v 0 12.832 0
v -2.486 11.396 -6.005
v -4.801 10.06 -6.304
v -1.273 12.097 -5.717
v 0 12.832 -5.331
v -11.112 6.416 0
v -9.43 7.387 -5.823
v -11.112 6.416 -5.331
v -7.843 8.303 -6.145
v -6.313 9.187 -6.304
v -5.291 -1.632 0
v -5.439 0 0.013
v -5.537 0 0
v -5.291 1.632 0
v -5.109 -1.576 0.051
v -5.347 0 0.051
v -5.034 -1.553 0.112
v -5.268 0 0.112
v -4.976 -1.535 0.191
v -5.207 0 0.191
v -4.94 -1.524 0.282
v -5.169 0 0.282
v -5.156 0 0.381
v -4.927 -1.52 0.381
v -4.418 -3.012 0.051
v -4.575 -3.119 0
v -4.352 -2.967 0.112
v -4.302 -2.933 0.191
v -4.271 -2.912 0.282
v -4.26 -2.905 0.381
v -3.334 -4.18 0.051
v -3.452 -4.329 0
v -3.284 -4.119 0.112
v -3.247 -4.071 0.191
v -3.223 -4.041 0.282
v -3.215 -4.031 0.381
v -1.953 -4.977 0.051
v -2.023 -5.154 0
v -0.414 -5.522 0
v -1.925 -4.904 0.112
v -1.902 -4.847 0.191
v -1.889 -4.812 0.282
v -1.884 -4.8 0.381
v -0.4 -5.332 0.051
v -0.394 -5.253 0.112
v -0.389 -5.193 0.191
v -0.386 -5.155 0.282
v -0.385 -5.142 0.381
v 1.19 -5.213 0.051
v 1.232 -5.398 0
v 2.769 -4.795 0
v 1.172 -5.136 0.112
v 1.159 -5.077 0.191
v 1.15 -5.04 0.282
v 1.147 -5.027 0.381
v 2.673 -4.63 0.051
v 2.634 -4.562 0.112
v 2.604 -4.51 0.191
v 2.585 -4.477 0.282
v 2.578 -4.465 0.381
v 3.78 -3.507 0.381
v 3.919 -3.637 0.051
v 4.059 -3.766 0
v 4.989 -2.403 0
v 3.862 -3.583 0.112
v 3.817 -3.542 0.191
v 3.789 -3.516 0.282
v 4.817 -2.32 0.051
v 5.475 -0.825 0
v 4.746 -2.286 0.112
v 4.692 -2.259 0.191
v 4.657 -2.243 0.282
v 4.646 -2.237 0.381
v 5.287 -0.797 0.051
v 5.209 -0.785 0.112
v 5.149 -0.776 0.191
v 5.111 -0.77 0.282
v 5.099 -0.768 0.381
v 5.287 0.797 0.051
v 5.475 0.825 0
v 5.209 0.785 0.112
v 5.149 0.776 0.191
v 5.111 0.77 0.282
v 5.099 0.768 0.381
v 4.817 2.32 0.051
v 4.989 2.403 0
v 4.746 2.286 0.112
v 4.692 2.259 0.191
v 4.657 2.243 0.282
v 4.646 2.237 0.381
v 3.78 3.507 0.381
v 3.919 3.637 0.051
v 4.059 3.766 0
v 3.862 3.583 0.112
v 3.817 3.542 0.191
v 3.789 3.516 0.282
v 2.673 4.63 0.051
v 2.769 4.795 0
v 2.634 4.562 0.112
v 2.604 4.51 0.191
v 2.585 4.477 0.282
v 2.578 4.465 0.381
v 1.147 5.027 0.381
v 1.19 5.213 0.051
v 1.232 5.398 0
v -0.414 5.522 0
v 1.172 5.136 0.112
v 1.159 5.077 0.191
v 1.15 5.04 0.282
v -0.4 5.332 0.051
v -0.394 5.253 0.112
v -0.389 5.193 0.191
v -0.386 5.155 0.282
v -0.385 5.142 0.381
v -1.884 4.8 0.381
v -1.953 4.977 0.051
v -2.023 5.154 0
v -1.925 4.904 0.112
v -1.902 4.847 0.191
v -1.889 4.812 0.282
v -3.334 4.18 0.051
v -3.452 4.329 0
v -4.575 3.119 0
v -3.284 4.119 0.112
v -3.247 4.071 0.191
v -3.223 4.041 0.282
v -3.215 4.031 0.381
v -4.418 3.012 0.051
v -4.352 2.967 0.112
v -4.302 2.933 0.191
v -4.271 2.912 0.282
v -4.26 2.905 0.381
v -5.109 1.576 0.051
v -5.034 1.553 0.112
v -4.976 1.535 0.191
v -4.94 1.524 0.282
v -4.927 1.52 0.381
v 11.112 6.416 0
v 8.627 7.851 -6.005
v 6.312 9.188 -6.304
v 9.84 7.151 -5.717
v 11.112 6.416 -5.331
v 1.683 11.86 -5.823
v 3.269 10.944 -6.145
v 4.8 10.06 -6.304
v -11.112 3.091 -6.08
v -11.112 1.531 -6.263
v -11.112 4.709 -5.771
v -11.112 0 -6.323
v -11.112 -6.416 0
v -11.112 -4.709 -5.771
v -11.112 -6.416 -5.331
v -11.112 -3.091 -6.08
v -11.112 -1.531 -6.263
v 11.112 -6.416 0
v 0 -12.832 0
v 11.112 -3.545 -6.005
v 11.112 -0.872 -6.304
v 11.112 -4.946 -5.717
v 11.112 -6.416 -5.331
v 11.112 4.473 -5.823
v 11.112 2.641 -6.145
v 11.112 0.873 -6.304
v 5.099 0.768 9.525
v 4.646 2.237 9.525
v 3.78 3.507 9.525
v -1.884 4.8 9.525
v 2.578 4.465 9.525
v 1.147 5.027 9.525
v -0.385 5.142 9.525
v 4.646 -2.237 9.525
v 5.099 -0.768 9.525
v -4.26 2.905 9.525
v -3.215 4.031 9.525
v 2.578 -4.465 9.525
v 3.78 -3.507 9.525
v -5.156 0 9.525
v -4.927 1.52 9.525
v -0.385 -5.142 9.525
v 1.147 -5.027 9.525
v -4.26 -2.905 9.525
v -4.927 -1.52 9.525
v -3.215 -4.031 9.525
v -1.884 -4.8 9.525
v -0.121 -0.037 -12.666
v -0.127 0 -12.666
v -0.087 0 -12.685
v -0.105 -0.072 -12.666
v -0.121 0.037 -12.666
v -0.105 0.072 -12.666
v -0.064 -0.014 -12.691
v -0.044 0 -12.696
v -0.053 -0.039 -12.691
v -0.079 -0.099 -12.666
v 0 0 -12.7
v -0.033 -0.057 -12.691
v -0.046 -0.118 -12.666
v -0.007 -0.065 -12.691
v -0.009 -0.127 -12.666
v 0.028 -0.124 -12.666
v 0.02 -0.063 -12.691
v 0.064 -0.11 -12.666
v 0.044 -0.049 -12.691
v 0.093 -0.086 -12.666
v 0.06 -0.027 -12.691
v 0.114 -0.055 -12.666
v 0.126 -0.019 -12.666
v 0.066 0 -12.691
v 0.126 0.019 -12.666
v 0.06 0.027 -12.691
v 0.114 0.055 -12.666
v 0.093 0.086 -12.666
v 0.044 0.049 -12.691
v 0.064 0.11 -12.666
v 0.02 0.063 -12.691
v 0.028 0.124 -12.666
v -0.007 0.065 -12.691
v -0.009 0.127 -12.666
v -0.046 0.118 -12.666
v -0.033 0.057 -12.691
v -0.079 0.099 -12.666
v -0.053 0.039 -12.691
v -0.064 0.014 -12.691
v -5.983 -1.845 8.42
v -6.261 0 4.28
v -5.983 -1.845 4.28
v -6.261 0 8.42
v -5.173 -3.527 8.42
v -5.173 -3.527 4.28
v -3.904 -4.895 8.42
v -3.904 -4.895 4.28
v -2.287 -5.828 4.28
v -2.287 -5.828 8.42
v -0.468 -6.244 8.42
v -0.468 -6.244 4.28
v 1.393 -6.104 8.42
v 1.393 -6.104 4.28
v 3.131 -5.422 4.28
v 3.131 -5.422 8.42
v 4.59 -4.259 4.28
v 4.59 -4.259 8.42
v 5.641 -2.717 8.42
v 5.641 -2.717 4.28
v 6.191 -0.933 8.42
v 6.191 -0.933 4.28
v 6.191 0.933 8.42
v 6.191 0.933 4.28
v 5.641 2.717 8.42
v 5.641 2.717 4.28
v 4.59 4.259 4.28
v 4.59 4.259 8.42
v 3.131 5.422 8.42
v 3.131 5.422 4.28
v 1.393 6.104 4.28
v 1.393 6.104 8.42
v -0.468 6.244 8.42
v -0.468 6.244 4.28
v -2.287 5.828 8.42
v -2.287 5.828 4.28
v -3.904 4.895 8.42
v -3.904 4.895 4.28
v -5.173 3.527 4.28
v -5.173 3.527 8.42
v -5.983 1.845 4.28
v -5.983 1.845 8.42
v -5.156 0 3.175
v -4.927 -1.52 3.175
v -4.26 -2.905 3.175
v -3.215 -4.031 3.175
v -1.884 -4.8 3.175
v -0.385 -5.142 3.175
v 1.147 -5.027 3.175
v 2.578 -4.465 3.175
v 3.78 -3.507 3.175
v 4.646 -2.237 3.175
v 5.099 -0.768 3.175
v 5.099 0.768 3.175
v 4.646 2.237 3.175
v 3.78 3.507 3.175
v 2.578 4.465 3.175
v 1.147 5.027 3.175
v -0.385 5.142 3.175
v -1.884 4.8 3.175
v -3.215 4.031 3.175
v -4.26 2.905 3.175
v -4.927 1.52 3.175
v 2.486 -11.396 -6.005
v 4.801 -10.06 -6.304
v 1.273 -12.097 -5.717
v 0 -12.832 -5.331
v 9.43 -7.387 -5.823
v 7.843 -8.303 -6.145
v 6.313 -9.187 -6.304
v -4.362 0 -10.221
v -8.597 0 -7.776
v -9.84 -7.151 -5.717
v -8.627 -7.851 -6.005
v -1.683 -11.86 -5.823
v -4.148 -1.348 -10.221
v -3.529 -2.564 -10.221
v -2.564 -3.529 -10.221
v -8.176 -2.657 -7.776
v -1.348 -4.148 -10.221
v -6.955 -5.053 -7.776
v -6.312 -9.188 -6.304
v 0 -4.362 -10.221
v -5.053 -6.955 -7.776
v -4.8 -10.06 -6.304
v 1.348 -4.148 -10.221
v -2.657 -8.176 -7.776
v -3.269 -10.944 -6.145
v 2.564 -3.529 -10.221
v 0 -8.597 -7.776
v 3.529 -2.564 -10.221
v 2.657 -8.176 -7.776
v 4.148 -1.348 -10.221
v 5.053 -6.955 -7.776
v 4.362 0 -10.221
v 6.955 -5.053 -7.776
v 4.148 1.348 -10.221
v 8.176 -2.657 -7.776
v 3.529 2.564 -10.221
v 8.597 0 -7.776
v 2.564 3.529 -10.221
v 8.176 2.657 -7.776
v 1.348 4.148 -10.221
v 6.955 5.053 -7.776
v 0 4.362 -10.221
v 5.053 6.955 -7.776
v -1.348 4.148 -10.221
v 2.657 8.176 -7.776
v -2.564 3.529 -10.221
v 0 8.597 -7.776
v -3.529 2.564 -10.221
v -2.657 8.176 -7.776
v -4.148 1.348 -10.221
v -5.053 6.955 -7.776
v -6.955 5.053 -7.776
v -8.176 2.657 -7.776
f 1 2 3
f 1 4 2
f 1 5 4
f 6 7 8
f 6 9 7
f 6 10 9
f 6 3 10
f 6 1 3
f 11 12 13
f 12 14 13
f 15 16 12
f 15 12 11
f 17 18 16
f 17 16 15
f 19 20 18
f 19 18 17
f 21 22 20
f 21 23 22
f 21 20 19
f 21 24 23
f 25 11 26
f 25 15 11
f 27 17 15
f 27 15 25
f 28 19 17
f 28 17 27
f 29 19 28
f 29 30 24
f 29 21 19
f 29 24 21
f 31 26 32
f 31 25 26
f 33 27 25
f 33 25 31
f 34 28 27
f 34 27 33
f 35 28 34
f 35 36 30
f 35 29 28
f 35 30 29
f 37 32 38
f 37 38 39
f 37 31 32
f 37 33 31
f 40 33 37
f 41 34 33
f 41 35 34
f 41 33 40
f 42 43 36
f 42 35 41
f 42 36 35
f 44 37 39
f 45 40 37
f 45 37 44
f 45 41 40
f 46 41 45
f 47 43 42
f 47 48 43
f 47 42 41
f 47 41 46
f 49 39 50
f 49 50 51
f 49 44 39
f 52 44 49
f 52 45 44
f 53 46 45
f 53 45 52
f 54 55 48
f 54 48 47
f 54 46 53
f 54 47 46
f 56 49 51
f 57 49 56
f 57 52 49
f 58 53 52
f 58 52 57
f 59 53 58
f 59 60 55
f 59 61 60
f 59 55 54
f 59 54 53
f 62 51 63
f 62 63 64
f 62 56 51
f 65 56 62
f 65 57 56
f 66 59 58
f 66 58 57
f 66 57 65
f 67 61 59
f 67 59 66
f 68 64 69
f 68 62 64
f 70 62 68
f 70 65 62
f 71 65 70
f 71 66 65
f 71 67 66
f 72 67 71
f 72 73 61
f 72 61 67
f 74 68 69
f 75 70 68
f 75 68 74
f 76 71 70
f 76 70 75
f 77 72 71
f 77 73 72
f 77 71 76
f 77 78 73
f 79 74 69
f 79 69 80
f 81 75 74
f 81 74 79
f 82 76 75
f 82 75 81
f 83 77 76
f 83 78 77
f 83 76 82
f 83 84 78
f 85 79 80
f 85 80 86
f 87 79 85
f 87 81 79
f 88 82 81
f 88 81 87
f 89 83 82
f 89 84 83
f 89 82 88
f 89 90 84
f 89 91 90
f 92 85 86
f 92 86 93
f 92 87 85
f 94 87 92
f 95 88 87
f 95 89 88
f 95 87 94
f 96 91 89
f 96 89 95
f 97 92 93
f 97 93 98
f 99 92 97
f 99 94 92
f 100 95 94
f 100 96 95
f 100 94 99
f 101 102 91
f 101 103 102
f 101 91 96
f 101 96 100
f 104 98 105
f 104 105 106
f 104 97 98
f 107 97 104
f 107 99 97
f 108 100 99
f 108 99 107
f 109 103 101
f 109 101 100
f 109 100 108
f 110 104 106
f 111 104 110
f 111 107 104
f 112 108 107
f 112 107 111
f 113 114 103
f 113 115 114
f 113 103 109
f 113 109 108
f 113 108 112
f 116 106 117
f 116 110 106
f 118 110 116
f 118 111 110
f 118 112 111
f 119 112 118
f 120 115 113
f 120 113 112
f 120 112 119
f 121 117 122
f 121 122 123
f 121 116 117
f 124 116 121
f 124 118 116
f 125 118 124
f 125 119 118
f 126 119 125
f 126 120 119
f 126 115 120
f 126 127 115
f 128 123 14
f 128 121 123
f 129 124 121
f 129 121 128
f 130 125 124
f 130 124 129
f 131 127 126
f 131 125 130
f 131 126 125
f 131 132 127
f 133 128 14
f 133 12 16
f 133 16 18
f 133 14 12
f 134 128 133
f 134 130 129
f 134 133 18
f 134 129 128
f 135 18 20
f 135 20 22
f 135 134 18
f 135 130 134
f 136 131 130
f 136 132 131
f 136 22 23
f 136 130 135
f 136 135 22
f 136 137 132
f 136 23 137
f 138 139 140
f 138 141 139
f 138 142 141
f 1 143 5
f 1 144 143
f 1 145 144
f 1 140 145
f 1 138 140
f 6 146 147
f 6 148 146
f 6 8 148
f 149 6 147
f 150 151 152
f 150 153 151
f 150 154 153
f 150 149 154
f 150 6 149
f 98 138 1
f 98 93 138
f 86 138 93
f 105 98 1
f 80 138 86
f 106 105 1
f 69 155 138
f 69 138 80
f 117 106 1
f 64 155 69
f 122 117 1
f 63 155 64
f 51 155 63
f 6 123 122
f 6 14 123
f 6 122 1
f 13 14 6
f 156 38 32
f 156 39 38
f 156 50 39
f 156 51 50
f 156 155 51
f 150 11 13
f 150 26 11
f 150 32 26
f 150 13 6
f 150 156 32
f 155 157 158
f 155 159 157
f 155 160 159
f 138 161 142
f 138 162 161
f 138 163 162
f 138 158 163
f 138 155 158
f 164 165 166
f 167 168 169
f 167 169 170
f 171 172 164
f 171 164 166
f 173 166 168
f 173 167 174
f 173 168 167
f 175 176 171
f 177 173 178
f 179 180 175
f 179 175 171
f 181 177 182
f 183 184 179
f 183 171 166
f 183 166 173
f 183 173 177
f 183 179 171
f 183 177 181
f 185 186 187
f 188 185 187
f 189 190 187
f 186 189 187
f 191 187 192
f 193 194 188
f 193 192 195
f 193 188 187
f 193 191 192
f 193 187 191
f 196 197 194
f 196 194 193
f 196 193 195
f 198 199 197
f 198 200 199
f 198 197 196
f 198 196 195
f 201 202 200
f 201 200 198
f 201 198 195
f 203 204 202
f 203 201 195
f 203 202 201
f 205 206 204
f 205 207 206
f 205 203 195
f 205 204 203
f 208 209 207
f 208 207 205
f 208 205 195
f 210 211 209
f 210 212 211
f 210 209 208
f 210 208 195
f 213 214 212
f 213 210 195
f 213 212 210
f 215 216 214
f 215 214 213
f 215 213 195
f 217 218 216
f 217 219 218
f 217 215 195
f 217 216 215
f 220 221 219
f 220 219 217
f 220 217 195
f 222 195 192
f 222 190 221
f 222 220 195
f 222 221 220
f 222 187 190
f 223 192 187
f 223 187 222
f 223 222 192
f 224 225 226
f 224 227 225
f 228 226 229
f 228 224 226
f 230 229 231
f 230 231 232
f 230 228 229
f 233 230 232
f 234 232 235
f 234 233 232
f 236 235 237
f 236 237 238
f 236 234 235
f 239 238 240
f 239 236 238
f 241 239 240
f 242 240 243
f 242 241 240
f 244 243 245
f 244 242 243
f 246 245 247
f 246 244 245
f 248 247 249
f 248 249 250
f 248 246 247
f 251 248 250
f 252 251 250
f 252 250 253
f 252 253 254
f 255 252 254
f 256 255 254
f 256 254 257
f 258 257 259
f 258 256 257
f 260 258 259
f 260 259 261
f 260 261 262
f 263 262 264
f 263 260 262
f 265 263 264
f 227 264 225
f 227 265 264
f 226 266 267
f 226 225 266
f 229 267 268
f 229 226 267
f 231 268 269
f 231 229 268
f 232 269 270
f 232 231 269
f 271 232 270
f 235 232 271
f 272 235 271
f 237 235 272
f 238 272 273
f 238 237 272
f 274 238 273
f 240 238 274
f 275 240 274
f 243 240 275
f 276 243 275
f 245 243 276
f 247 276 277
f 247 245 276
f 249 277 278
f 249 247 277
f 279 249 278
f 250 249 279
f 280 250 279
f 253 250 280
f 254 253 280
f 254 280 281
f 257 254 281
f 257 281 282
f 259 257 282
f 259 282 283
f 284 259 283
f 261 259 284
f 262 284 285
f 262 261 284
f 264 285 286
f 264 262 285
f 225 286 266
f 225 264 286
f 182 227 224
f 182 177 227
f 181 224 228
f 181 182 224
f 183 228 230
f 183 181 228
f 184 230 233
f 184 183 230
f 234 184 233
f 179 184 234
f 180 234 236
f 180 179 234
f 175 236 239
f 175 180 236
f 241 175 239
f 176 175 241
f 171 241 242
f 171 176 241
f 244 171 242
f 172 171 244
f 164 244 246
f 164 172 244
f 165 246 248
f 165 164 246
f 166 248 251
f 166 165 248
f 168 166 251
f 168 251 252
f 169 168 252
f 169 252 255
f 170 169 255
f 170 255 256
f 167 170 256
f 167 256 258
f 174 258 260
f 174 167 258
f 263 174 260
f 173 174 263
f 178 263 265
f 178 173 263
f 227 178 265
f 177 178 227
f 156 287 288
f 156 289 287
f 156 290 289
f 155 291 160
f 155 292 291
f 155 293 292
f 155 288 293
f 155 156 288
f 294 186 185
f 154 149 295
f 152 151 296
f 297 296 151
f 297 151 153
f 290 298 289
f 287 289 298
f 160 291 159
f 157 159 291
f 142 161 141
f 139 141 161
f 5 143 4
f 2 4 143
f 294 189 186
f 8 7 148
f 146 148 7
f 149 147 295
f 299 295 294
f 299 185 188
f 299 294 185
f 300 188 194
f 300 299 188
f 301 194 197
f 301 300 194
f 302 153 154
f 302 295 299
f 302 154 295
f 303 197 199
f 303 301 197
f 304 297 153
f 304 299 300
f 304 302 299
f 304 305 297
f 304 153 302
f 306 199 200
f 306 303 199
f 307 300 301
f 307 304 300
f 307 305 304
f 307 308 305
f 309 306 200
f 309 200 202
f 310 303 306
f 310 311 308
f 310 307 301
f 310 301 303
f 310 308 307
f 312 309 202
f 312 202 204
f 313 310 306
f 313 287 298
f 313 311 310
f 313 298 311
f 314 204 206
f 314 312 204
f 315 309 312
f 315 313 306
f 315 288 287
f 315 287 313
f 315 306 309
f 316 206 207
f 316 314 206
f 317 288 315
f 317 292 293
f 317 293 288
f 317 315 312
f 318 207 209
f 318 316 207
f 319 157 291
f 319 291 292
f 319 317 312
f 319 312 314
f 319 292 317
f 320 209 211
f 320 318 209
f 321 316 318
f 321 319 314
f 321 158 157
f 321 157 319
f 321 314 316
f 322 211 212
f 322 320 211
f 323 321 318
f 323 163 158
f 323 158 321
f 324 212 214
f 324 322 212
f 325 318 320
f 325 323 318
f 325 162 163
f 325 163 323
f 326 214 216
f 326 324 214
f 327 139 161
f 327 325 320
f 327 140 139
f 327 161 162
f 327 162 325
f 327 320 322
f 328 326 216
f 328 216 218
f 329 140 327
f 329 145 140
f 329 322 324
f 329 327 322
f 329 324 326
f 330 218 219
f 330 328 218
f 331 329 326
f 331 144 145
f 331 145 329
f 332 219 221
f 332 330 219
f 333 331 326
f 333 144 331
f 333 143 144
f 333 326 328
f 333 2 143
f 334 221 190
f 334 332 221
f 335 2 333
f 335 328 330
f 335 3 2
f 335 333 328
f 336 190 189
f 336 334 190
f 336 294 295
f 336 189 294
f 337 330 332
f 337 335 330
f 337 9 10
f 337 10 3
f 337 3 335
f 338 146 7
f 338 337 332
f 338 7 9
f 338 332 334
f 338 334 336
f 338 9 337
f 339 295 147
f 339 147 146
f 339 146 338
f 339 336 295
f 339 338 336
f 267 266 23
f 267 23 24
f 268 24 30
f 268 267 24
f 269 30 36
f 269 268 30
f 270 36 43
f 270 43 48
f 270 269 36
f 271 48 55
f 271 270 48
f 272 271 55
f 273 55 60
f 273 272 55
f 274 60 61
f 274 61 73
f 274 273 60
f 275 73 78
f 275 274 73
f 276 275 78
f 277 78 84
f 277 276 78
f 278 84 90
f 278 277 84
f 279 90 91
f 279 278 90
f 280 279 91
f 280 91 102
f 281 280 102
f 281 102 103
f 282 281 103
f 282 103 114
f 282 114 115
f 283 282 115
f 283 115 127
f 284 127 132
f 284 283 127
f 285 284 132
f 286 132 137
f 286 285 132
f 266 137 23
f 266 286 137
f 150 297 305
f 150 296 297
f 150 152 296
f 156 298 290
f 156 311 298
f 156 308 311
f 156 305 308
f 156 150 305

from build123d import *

# Parameters (mm, degrees)
SKETCH2_OUTSIDE_W  = 59.38
SKETCH2_OUTSIDE_H  = 59.38
CUT_EXTRUDE1_DEPTH = 13.7
FILLET1_R          = 0.381


with BuildPart() as part:
    # Sketch1 → Revolve1 (revolve)
    with BuildSketch(Plane(origin=(0, 0, 0), x_dir=(0, 0, -1), z_dir=(1, 0, 0)), mode=Mode.PRIVATE) as revolve1_sk:
        with BuildLine():
            Line((0, 22.065104351), (0, 5.1562))
            Line((0, 5.1562), (-3.175, 5.1562))
            Line((-3.175, 5.1562), (-4.2799, 6.2611))
            Line((-4.2799, 6.2611), (-8.4201, 6.2611))
            Line((-8.4201, 6.2611), (-9.525, 5.1562))
            Line((-9.525, 5.1562), (-9.525, 0))
            Line((-9.525, 0), (12.7, 0))
            ThreePointArc((12.7, 0), (12.69134516, 0.065740037), (12.665970453, 0.127))
            Line((12.665970453, 0.127), (0, 22.065104351))
        make_face()
    revolve(revolve1_sk.sketch.rotate(Axis((0, 0, 0), (0, 0, 1)), 90), axis=Axis((0, 0, 0), (0, 0, 1)))  # turned: the seam where the file's is

    # Sketch2 outside → Cut-Extrude1 (cut, through all)
    with BuildSketch(Plane.XY):
        Rectangle(SKETCH2_OUTSIDE_W, SKETCH2_OUTSIDE_H)
        Polygon((0, 12.831609733), (-11.1125, 6.415804866), (-11.1125, -6.415804866), (0, -12.831609733), (11.1125, -6.415804866), (11.1125, 6.415804866), align=None, mode=Mode.SUBTRACT)
    extrude(amount=-CUT_EXTRUDE1_DEPTH, mode=Mode.SUBTRACT)

    # Fillet1
    fillet1_edges = [part.edges().sort_by_distance(p)[0] for p in [
        (5.1562, 0, 0),
    ]]
    fillet(fillet1_edges, radius=FILLET1_R)


solid = part.part
